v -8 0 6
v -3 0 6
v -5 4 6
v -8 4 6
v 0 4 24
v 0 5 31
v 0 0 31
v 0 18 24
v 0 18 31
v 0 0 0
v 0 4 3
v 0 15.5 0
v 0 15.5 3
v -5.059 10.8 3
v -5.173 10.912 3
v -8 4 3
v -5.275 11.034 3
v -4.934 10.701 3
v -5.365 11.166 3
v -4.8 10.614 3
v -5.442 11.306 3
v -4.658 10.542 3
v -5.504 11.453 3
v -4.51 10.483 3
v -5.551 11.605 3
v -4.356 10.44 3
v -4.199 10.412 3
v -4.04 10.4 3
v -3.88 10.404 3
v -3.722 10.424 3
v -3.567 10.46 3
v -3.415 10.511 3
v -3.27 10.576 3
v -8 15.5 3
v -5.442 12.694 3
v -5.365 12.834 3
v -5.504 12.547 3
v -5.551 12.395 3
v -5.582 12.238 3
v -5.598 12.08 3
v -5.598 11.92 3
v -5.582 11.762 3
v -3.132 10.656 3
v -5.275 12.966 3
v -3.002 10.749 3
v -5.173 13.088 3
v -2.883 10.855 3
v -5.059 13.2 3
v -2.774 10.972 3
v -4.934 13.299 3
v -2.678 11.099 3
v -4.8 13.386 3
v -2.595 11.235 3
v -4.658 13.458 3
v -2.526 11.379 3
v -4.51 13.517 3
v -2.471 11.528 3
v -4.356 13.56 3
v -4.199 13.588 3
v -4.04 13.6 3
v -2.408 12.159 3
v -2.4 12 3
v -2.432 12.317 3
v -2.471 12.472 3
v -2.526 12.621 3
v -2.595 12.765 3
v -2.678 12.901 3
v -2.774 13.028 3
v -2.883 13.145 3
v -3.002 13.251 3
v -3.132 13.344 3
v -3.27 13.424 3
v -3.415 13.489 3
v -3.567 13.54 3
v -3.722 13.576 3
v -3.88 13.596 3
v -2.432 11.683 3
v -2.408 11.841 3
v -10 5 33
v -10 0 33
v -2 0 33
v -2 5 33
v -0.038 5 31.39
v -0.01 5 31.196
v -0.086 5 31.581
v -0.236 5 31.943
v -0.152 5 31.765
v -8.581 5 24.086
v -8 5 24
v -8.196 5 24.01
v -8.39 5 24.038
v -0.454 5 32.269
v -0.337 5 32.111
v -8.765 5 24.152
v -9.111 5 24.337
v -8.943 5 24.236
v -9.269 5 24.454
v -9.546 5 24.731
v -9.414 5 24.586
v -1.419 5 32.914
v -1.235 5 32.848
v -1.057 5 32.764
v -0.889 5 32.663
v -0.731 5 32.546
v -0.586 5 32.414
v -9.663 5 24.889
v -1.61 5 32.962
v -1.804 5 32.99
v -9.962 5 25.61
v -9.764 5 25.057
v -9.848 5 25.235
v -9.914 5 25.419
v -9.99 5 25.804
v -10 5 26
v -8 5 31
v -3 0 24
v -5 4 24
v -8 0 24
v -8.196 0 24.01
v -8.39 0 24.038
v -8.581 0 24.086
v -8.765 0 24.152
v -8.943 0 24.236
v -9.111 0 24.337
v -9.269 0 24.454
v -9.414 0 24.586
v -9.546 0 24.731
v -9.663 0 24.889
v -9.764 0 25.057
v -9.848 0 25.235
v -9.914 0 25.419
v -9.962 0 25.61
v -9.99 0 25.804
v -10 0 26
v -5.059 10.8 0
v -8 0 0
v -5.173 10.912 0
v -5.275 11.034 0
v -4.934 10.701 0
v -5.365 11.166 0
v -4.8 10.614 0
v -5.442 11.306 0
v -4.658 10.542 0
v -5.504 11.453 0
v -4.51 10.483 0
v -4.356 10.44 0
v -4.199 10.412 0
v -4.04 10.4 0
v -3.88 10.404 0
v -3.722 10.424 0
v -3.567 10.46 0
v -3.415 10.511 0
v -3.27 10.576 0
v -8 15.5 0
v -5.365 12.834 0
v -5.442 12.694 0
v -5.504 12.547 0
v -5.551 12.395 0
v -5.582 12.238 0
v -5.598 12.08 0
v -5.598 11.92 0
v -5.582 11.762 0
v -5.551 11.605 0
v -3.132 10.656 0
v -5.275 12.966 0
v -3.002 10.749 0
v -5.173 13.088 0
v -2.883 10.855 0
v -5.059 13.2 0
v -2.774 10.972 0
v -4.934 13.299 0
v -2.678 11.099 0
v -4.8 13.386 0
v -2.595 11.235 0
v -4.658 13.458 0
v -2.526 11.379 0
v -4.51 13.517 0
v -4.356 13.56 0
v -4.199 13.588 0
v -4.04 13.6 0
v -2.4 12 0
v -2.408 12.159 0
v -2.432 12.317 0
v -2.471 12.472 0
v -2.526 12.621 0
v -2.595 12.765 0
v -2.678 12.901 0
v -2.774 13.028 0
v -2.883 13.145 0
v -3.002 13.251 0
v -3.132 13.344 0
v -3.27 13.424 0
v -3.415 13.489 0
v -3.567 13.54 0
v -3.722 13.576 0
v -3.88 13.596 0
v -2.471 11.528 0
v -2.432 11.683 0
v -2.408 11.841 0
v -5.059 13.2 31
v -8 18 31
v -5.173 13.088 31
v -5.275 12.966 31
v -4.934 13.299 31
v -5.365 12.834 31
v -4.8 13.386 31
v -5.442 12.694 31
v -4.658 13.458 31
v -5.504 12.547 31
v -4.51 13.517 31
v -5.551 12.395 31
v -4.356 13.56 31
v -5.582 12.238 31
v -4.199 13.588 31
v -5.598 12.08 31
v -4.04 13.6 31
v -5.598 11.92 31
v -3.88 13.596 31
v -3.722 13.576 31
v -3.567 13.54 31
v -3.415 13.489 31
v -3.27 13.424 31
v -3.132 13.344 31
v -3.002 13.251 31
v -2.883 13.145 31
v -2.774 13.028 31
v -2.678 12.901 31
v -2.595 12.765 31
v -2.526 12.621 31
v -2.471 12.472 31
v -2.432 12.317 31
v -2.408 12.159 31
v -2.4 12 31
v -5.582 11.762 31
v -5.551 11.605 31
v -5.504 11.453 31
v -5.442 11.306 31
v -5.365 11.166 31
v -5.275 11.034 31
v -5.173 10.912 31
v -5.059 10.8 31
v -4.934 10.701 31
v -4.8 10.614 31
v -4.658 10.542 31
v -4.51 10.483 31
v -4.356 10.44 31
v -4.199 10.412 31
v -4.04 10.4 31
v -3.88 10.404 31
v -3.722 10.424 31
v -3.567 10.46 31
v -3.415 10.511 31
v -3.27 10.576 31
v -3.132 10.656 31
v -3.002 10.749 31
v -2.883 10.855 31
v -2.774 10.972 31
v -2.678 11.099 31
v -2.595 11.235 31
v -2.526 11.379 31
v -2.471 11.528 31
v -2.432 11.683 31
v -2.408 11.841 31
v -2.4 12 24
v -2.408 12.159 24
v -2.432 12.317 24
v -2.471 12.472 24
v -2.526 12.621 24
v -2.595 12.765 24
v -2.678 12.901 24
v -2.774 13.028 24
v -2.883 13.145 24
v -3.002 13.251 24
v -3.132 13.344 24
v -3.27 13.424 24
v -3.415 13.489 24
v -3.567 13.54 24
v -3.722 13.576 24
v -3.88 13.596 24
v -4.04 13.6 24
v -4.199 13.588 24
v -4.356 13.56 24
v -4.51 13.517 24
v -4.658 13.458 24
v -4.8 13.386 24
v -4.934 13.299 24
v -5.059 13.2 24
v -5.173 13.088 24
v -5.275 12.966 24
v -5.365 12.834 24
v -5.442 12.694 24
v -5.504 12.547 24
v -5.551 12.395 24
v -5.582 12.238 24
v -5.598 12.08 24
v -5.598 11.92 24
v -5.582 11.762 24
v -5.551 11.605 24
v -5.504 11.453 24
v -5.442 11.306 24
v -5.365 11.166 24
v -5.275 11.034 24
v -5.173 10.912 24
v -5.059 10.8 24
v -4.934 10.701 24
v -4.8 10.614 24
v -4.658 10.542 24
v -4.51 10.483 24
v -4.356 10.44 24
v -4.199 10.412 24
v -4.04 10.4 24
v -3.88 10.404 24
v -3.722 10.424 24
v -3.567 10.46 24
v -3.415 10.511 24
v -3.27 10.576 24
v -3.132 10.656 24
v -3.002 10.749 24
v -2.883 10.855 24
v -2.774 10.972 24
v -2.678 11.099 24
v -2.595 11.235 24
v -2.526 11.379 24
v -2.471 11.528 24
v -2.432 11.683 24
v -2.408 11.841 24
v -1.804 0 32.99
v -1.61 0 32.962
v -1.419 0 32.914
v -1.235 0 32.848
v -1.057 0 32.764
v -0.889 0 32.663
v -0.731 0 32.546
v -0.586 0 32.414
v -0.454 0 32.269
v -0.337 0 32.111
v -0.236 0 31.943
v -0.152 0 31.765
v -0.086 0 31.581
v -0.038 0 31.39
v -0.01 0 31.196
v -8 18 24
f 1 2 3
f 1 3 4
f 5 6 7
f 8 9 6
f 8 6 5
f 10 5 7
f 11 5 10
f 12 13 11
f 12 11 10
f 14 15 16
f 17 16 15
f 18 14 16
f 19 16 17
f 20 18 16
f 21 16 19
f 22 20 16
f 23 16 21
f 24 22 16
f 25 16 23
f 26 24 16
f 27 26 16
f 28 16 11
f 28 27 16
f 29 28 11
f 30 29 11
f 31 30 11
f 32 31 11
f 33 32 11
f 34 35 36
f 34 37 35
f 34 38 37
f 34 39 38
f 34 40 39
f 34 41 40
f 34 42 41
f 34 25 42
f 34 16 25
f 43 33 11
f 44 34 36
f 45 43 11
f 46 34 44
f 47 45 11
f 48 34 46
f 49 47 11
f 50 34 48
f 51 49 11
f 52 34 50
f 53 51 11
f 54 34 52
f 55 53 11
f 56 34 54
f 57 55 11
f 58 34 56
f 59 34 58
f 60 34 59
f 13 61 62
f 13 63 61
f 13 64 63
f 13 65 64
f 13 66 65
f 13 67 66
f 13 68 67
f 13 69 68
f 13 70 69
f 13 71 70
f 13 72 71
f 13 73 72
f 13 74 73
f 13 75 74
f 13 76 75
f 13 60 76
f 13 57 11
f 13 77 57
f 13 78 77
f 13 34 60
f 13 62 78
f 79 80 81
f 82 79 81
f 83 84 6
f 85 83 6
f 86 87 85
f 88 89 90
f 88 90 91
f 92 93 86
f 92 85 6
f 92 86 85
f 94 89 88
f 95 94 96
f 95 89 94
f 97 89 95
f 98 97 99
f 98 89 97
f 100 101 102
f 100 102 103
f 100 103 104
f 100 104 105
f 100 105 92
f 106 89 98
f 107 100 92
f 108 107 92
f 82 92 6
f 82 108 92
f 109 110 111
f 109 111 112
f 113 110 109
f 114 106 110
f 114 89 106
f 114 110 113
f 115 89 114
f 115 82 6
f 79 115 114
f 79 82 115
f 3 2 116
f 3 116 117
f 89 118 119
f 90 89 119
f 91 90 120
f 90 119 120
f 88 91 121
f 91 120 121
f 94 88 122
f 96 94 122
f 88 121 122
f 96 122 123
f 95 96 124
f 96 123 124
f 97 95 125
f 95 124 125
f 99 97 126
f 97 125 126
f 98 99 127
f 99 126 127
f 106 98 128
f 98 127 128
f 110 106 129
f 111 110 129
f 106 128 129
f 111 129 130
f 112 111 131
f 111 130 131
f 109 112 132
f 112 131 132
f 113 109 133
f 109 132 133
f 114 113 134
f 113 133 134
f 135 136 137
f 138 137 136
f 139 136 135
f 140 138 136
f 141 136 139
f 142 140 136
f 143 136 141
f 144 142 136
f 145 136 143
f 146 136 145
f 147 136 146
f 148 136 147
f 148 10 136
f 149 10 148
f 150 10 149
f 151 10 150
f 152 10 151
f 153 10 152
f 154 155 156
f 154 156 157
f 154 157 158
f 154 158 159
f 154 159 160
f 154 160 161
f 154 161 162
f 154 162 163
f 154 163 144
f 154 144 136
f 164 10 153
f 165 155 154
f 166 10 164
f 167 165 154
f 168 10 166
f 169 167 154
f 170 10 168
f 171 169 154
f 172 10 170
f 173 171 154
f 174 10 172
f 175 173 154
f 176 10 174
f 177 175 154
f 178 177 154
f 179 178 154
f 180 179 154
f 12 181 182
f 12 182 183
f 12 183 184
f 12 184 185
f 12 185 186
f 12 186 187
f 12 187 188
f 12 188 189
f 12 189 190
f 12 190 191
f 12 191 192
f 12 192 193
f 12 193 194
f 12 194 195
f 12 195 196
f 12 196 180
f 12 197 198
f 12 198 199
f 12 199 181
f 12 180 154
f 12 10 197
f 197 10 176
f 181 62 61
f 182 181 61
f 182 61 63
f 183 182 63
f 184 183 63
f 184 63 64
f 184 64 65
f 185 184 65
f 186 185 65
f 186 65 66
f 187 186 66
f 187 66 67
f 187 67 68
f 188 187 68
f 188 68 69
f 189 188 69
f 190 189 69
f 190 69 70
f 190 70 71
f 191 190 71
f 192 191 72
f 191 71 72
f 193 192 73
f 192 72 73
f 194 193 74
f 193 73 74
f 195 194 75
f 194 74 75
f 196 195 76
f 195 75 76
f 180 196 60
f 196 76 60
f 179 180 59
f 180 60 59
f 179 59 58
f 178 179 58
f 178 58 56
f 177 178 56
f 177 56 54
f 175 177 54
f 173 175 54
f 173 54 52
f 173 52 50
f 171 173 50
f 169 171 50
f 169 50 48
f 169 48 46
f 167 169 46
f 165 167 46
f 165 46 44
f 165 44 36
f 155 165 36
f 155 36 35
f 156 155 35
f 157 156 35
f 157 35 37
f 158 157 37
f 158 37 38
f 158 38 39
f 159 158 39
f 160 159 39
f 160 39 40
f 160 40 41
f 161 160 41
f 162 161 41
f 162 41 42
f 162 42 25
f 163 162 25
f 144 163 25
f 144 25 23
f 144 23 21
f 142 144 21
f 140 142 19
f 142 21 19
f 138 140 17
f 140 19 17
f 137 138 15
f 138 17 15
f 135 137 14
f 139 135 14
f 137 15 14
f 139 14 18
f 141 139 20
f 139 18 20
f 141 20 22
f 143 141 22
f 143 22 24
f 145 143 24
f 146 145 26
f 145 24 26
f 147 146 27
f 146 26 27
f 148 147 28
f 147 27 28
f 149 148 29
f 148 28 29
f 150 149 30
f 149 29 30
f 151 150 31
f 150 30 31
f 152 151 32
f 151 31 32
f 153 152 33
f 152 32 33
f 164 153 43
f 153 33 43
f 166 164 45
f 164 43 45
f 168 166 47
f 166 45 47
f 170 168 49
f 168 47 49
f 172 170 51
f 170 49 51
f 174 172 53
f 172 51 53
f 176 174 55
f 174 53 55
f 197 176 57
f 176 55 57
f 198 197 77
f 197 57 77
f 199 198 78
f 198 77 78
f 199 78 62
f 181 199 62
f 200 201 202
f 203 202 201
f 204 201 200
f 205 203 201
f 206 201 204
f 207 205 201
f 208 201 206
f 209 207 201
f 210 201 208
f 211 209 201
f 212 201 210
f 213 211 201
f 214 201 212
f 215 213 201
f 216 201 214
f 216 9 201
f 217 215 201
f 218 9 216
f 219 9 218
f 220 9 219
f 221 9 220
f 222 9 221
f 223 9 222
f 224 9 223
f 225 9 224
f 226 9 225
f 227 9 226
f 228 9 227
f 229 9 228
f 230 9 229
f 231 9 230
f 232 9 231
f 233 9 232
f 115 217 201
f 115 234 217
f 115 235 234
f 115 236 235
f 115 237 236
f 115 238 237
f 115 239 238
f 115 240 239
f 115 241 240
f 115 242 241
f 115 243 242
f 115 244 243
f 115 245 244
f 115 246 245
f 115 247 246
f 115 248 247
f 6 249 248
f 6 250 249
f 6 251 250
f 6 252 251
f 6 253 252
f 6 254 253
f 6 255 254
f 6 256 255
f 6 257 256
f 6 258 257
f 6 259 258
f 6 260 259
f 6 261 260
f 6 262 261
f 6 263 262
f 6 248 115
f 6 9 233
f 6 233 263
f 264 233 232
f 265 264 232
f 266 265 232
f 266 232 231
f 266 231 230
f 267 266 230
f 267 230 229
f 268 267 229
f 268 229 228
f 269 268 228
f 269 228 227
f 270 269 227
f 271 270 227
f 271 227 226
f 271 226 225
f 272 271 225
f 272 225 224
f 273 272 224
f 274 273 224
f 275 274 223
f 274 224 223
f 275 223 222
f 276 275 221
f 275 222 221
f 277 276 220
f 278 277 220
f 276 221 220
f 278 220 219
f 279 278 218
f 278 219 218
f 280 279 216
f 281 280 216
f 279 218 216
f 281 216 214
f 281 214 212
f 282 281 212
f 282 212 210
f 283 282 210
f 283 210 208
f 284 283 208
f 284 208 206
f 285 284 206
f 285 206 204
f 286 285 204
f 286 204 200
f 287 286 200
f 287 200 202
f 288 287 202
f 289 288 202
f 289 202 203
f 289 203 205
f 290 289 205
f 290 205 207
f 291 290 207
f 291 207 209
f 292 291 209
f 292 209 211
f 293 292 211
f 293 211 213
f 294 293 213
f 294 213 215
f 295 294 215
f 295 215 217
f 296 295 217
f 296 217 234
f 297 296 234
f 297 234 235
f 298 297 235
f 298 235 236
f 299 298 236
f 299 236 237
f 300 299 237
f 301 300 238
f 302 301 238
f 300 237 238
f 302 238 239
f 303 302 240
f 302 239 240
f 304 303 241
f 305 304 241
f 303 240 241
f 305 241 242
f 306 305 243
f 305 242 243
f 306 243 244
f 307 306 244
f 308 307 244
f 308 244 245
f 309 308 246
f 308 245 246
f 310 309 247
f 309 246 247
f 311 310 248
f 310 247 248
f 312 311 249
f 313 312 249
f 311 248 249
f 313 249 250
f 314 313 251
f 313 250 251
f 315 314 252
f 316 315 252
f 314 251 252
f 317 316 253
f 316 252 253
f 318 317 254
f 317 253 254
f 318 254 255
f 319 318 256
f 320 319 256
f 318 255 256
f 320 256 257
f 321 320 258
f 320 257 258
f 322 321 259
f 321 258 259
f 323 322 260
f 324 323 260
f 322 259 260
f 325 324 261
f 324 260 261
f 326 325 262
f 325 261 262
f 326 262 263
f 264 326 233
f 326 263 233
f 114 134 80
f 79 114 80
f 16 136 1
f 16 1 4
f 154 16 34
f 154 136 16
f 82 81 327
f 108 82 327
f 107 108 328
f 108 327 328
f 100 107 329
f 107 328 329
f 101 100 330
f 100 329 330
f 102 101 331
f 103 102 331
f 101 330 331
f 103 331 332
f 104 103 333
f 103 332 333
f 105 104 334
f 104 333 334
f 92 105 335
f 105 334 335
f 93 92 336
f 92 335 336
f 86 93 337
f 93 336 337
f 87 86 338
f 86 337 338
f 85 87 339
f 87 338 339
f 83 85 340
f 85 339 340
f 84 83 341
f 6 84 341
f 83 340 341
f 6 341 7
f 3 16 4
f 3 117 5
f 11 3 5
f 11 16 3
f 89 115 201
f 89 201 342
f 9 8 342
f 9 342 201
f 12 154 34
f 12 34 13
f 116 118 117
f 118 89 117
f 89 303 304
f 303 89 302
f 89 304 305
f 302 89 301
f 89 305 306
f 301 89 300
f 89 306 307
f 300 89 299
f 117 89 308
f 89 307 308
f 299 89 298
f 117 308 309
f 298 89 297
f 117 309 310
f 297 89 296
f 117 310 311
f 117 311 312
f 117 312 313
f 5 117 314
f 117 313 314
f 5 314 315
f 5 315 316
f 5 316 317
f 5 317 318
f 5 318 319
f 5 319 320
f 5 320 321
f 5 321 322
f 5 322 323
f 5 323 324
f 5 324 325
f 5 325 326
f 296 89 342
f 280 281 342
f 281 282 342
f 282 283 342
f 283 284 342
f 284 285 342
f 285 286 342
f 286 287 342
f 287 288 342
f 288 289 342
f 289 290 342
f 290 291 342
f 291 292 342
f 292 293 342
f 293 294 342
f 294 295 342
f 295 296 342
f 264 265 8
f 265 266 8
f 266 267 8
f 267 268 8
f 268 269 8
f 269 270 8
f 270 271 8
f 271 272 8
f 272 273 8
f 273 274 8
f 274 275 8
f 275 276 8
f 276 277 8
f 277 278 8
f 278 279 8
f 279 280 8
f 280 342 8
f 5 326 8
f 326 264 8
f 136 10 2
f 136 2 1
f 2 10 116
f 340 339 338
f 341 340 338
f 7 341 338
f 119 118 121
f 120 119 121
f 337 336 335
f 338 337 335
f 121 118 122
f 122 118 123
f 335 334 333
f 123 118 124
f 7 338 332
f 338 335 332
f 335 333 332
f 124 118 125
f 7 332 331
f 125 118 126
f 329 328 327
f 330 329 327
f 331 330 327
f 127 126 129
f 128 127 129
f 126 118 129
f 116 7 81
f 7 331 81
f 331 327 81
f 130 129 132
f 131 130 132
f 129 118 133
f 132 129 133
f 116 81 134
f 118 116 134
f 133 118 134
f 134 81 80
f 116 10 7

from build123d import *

# Parameters (mm, degrees)
BOSS_EXTRUDE1_DEPTH = 8
CUT_EXTRUDE2_DEPTH  = 21
BOSS_EXTRUDE2_DEPTH = 3
BOSS_EXTRUDE5_DEPTH = 5
SKETCH6_R           = 1.6
CUT_EXTRUDE3_DEPTH  = 38.215588132
SKETCH12_W          = 8
SKETCH12_H          = 3
CUT_EXTRUDE4_DEPTH  = 0.5


with BuildPart() as part:
    # Sketch1 → Boss-Extrude1 (new body)
    with BuildSketch(Plane(origin=(0, 0, 0), x_dir=(0, 0, -1), z_dir=(1, 0, 0))):
        Polygon((0, 0), (0, 16), (-3, 16), (-3, 4), (-24, 4), (-24, 18), (-31, 18), (-31, 0), align=None)
    extrude(amount=-BOSS_EXTRUDE1_DEPTH)

    # Sketch5 → Cut-Extrude2 (cut)
    with BuildSketch(Plane.XY.offset(3)):
        Polygon((-8, 0), (-3, 0), (-5, 4), (-8, 4), align=None)
    extrude(amount=CUT_EXTRUDE2_DEPTH, mode=Mode.SUBTRACT)

    # Sketch8 → Boss-Extrude2 (add)
    with BuildSketch(Plane.XY.offset(3)):
        Polygon((-8, 4), (-5, 4), (-3, 0), (-8, 0), align=None)
    extrude(amount=BOSS_EXTRUDE2_DEPTH)

    # Sketch11 → Boss-Extrude5 (add)
    with BuildSketch(Plane.XZ):
        with BuildLine():
            Line((-10, 26), (-10, 33))
            Line((-10, 33), (-2, 33))
            ThreePointArc((-2, 33), (-0.585786438, 32.414213562), (0, 31))
            Line((0, 31), (-8, 31))
            Line((-8, 31), (-8, 24))
            ThreePointArc((-8, 24), (-9.414213562, 24.585786438), (-10, 26))
        make_face()
    extrude(amount=-BOSS_EXTRUDE5_DEPTH)

    # Sketch6 → Cut-Extrude3 (cut, through all)
    with BuildSketch(Plane.XY.offset(31)):
        with Locations((-4, 12)):
            Circle(SKETCH6_R)
    extrude(amount=-CUT_EXTRUDE3_DEPTH, mode=Mode.SUBTRACT)

    # Sketch12 → Cut-Extrude4 (cut)
    with BuildSketch(Plane(origin=(0, 16, 0), x_dir=(1, 0, 0), z_dir=(0, 1, 0))):
        with Locations((-4, -1.5)):
            Rectangle(SKETCH12_W, SKETCH12_H)
    extrude(amount=-CUT_EXTRUDE4_DEPTH, mode=Mode.SUBTRACT)


solid = part.part
